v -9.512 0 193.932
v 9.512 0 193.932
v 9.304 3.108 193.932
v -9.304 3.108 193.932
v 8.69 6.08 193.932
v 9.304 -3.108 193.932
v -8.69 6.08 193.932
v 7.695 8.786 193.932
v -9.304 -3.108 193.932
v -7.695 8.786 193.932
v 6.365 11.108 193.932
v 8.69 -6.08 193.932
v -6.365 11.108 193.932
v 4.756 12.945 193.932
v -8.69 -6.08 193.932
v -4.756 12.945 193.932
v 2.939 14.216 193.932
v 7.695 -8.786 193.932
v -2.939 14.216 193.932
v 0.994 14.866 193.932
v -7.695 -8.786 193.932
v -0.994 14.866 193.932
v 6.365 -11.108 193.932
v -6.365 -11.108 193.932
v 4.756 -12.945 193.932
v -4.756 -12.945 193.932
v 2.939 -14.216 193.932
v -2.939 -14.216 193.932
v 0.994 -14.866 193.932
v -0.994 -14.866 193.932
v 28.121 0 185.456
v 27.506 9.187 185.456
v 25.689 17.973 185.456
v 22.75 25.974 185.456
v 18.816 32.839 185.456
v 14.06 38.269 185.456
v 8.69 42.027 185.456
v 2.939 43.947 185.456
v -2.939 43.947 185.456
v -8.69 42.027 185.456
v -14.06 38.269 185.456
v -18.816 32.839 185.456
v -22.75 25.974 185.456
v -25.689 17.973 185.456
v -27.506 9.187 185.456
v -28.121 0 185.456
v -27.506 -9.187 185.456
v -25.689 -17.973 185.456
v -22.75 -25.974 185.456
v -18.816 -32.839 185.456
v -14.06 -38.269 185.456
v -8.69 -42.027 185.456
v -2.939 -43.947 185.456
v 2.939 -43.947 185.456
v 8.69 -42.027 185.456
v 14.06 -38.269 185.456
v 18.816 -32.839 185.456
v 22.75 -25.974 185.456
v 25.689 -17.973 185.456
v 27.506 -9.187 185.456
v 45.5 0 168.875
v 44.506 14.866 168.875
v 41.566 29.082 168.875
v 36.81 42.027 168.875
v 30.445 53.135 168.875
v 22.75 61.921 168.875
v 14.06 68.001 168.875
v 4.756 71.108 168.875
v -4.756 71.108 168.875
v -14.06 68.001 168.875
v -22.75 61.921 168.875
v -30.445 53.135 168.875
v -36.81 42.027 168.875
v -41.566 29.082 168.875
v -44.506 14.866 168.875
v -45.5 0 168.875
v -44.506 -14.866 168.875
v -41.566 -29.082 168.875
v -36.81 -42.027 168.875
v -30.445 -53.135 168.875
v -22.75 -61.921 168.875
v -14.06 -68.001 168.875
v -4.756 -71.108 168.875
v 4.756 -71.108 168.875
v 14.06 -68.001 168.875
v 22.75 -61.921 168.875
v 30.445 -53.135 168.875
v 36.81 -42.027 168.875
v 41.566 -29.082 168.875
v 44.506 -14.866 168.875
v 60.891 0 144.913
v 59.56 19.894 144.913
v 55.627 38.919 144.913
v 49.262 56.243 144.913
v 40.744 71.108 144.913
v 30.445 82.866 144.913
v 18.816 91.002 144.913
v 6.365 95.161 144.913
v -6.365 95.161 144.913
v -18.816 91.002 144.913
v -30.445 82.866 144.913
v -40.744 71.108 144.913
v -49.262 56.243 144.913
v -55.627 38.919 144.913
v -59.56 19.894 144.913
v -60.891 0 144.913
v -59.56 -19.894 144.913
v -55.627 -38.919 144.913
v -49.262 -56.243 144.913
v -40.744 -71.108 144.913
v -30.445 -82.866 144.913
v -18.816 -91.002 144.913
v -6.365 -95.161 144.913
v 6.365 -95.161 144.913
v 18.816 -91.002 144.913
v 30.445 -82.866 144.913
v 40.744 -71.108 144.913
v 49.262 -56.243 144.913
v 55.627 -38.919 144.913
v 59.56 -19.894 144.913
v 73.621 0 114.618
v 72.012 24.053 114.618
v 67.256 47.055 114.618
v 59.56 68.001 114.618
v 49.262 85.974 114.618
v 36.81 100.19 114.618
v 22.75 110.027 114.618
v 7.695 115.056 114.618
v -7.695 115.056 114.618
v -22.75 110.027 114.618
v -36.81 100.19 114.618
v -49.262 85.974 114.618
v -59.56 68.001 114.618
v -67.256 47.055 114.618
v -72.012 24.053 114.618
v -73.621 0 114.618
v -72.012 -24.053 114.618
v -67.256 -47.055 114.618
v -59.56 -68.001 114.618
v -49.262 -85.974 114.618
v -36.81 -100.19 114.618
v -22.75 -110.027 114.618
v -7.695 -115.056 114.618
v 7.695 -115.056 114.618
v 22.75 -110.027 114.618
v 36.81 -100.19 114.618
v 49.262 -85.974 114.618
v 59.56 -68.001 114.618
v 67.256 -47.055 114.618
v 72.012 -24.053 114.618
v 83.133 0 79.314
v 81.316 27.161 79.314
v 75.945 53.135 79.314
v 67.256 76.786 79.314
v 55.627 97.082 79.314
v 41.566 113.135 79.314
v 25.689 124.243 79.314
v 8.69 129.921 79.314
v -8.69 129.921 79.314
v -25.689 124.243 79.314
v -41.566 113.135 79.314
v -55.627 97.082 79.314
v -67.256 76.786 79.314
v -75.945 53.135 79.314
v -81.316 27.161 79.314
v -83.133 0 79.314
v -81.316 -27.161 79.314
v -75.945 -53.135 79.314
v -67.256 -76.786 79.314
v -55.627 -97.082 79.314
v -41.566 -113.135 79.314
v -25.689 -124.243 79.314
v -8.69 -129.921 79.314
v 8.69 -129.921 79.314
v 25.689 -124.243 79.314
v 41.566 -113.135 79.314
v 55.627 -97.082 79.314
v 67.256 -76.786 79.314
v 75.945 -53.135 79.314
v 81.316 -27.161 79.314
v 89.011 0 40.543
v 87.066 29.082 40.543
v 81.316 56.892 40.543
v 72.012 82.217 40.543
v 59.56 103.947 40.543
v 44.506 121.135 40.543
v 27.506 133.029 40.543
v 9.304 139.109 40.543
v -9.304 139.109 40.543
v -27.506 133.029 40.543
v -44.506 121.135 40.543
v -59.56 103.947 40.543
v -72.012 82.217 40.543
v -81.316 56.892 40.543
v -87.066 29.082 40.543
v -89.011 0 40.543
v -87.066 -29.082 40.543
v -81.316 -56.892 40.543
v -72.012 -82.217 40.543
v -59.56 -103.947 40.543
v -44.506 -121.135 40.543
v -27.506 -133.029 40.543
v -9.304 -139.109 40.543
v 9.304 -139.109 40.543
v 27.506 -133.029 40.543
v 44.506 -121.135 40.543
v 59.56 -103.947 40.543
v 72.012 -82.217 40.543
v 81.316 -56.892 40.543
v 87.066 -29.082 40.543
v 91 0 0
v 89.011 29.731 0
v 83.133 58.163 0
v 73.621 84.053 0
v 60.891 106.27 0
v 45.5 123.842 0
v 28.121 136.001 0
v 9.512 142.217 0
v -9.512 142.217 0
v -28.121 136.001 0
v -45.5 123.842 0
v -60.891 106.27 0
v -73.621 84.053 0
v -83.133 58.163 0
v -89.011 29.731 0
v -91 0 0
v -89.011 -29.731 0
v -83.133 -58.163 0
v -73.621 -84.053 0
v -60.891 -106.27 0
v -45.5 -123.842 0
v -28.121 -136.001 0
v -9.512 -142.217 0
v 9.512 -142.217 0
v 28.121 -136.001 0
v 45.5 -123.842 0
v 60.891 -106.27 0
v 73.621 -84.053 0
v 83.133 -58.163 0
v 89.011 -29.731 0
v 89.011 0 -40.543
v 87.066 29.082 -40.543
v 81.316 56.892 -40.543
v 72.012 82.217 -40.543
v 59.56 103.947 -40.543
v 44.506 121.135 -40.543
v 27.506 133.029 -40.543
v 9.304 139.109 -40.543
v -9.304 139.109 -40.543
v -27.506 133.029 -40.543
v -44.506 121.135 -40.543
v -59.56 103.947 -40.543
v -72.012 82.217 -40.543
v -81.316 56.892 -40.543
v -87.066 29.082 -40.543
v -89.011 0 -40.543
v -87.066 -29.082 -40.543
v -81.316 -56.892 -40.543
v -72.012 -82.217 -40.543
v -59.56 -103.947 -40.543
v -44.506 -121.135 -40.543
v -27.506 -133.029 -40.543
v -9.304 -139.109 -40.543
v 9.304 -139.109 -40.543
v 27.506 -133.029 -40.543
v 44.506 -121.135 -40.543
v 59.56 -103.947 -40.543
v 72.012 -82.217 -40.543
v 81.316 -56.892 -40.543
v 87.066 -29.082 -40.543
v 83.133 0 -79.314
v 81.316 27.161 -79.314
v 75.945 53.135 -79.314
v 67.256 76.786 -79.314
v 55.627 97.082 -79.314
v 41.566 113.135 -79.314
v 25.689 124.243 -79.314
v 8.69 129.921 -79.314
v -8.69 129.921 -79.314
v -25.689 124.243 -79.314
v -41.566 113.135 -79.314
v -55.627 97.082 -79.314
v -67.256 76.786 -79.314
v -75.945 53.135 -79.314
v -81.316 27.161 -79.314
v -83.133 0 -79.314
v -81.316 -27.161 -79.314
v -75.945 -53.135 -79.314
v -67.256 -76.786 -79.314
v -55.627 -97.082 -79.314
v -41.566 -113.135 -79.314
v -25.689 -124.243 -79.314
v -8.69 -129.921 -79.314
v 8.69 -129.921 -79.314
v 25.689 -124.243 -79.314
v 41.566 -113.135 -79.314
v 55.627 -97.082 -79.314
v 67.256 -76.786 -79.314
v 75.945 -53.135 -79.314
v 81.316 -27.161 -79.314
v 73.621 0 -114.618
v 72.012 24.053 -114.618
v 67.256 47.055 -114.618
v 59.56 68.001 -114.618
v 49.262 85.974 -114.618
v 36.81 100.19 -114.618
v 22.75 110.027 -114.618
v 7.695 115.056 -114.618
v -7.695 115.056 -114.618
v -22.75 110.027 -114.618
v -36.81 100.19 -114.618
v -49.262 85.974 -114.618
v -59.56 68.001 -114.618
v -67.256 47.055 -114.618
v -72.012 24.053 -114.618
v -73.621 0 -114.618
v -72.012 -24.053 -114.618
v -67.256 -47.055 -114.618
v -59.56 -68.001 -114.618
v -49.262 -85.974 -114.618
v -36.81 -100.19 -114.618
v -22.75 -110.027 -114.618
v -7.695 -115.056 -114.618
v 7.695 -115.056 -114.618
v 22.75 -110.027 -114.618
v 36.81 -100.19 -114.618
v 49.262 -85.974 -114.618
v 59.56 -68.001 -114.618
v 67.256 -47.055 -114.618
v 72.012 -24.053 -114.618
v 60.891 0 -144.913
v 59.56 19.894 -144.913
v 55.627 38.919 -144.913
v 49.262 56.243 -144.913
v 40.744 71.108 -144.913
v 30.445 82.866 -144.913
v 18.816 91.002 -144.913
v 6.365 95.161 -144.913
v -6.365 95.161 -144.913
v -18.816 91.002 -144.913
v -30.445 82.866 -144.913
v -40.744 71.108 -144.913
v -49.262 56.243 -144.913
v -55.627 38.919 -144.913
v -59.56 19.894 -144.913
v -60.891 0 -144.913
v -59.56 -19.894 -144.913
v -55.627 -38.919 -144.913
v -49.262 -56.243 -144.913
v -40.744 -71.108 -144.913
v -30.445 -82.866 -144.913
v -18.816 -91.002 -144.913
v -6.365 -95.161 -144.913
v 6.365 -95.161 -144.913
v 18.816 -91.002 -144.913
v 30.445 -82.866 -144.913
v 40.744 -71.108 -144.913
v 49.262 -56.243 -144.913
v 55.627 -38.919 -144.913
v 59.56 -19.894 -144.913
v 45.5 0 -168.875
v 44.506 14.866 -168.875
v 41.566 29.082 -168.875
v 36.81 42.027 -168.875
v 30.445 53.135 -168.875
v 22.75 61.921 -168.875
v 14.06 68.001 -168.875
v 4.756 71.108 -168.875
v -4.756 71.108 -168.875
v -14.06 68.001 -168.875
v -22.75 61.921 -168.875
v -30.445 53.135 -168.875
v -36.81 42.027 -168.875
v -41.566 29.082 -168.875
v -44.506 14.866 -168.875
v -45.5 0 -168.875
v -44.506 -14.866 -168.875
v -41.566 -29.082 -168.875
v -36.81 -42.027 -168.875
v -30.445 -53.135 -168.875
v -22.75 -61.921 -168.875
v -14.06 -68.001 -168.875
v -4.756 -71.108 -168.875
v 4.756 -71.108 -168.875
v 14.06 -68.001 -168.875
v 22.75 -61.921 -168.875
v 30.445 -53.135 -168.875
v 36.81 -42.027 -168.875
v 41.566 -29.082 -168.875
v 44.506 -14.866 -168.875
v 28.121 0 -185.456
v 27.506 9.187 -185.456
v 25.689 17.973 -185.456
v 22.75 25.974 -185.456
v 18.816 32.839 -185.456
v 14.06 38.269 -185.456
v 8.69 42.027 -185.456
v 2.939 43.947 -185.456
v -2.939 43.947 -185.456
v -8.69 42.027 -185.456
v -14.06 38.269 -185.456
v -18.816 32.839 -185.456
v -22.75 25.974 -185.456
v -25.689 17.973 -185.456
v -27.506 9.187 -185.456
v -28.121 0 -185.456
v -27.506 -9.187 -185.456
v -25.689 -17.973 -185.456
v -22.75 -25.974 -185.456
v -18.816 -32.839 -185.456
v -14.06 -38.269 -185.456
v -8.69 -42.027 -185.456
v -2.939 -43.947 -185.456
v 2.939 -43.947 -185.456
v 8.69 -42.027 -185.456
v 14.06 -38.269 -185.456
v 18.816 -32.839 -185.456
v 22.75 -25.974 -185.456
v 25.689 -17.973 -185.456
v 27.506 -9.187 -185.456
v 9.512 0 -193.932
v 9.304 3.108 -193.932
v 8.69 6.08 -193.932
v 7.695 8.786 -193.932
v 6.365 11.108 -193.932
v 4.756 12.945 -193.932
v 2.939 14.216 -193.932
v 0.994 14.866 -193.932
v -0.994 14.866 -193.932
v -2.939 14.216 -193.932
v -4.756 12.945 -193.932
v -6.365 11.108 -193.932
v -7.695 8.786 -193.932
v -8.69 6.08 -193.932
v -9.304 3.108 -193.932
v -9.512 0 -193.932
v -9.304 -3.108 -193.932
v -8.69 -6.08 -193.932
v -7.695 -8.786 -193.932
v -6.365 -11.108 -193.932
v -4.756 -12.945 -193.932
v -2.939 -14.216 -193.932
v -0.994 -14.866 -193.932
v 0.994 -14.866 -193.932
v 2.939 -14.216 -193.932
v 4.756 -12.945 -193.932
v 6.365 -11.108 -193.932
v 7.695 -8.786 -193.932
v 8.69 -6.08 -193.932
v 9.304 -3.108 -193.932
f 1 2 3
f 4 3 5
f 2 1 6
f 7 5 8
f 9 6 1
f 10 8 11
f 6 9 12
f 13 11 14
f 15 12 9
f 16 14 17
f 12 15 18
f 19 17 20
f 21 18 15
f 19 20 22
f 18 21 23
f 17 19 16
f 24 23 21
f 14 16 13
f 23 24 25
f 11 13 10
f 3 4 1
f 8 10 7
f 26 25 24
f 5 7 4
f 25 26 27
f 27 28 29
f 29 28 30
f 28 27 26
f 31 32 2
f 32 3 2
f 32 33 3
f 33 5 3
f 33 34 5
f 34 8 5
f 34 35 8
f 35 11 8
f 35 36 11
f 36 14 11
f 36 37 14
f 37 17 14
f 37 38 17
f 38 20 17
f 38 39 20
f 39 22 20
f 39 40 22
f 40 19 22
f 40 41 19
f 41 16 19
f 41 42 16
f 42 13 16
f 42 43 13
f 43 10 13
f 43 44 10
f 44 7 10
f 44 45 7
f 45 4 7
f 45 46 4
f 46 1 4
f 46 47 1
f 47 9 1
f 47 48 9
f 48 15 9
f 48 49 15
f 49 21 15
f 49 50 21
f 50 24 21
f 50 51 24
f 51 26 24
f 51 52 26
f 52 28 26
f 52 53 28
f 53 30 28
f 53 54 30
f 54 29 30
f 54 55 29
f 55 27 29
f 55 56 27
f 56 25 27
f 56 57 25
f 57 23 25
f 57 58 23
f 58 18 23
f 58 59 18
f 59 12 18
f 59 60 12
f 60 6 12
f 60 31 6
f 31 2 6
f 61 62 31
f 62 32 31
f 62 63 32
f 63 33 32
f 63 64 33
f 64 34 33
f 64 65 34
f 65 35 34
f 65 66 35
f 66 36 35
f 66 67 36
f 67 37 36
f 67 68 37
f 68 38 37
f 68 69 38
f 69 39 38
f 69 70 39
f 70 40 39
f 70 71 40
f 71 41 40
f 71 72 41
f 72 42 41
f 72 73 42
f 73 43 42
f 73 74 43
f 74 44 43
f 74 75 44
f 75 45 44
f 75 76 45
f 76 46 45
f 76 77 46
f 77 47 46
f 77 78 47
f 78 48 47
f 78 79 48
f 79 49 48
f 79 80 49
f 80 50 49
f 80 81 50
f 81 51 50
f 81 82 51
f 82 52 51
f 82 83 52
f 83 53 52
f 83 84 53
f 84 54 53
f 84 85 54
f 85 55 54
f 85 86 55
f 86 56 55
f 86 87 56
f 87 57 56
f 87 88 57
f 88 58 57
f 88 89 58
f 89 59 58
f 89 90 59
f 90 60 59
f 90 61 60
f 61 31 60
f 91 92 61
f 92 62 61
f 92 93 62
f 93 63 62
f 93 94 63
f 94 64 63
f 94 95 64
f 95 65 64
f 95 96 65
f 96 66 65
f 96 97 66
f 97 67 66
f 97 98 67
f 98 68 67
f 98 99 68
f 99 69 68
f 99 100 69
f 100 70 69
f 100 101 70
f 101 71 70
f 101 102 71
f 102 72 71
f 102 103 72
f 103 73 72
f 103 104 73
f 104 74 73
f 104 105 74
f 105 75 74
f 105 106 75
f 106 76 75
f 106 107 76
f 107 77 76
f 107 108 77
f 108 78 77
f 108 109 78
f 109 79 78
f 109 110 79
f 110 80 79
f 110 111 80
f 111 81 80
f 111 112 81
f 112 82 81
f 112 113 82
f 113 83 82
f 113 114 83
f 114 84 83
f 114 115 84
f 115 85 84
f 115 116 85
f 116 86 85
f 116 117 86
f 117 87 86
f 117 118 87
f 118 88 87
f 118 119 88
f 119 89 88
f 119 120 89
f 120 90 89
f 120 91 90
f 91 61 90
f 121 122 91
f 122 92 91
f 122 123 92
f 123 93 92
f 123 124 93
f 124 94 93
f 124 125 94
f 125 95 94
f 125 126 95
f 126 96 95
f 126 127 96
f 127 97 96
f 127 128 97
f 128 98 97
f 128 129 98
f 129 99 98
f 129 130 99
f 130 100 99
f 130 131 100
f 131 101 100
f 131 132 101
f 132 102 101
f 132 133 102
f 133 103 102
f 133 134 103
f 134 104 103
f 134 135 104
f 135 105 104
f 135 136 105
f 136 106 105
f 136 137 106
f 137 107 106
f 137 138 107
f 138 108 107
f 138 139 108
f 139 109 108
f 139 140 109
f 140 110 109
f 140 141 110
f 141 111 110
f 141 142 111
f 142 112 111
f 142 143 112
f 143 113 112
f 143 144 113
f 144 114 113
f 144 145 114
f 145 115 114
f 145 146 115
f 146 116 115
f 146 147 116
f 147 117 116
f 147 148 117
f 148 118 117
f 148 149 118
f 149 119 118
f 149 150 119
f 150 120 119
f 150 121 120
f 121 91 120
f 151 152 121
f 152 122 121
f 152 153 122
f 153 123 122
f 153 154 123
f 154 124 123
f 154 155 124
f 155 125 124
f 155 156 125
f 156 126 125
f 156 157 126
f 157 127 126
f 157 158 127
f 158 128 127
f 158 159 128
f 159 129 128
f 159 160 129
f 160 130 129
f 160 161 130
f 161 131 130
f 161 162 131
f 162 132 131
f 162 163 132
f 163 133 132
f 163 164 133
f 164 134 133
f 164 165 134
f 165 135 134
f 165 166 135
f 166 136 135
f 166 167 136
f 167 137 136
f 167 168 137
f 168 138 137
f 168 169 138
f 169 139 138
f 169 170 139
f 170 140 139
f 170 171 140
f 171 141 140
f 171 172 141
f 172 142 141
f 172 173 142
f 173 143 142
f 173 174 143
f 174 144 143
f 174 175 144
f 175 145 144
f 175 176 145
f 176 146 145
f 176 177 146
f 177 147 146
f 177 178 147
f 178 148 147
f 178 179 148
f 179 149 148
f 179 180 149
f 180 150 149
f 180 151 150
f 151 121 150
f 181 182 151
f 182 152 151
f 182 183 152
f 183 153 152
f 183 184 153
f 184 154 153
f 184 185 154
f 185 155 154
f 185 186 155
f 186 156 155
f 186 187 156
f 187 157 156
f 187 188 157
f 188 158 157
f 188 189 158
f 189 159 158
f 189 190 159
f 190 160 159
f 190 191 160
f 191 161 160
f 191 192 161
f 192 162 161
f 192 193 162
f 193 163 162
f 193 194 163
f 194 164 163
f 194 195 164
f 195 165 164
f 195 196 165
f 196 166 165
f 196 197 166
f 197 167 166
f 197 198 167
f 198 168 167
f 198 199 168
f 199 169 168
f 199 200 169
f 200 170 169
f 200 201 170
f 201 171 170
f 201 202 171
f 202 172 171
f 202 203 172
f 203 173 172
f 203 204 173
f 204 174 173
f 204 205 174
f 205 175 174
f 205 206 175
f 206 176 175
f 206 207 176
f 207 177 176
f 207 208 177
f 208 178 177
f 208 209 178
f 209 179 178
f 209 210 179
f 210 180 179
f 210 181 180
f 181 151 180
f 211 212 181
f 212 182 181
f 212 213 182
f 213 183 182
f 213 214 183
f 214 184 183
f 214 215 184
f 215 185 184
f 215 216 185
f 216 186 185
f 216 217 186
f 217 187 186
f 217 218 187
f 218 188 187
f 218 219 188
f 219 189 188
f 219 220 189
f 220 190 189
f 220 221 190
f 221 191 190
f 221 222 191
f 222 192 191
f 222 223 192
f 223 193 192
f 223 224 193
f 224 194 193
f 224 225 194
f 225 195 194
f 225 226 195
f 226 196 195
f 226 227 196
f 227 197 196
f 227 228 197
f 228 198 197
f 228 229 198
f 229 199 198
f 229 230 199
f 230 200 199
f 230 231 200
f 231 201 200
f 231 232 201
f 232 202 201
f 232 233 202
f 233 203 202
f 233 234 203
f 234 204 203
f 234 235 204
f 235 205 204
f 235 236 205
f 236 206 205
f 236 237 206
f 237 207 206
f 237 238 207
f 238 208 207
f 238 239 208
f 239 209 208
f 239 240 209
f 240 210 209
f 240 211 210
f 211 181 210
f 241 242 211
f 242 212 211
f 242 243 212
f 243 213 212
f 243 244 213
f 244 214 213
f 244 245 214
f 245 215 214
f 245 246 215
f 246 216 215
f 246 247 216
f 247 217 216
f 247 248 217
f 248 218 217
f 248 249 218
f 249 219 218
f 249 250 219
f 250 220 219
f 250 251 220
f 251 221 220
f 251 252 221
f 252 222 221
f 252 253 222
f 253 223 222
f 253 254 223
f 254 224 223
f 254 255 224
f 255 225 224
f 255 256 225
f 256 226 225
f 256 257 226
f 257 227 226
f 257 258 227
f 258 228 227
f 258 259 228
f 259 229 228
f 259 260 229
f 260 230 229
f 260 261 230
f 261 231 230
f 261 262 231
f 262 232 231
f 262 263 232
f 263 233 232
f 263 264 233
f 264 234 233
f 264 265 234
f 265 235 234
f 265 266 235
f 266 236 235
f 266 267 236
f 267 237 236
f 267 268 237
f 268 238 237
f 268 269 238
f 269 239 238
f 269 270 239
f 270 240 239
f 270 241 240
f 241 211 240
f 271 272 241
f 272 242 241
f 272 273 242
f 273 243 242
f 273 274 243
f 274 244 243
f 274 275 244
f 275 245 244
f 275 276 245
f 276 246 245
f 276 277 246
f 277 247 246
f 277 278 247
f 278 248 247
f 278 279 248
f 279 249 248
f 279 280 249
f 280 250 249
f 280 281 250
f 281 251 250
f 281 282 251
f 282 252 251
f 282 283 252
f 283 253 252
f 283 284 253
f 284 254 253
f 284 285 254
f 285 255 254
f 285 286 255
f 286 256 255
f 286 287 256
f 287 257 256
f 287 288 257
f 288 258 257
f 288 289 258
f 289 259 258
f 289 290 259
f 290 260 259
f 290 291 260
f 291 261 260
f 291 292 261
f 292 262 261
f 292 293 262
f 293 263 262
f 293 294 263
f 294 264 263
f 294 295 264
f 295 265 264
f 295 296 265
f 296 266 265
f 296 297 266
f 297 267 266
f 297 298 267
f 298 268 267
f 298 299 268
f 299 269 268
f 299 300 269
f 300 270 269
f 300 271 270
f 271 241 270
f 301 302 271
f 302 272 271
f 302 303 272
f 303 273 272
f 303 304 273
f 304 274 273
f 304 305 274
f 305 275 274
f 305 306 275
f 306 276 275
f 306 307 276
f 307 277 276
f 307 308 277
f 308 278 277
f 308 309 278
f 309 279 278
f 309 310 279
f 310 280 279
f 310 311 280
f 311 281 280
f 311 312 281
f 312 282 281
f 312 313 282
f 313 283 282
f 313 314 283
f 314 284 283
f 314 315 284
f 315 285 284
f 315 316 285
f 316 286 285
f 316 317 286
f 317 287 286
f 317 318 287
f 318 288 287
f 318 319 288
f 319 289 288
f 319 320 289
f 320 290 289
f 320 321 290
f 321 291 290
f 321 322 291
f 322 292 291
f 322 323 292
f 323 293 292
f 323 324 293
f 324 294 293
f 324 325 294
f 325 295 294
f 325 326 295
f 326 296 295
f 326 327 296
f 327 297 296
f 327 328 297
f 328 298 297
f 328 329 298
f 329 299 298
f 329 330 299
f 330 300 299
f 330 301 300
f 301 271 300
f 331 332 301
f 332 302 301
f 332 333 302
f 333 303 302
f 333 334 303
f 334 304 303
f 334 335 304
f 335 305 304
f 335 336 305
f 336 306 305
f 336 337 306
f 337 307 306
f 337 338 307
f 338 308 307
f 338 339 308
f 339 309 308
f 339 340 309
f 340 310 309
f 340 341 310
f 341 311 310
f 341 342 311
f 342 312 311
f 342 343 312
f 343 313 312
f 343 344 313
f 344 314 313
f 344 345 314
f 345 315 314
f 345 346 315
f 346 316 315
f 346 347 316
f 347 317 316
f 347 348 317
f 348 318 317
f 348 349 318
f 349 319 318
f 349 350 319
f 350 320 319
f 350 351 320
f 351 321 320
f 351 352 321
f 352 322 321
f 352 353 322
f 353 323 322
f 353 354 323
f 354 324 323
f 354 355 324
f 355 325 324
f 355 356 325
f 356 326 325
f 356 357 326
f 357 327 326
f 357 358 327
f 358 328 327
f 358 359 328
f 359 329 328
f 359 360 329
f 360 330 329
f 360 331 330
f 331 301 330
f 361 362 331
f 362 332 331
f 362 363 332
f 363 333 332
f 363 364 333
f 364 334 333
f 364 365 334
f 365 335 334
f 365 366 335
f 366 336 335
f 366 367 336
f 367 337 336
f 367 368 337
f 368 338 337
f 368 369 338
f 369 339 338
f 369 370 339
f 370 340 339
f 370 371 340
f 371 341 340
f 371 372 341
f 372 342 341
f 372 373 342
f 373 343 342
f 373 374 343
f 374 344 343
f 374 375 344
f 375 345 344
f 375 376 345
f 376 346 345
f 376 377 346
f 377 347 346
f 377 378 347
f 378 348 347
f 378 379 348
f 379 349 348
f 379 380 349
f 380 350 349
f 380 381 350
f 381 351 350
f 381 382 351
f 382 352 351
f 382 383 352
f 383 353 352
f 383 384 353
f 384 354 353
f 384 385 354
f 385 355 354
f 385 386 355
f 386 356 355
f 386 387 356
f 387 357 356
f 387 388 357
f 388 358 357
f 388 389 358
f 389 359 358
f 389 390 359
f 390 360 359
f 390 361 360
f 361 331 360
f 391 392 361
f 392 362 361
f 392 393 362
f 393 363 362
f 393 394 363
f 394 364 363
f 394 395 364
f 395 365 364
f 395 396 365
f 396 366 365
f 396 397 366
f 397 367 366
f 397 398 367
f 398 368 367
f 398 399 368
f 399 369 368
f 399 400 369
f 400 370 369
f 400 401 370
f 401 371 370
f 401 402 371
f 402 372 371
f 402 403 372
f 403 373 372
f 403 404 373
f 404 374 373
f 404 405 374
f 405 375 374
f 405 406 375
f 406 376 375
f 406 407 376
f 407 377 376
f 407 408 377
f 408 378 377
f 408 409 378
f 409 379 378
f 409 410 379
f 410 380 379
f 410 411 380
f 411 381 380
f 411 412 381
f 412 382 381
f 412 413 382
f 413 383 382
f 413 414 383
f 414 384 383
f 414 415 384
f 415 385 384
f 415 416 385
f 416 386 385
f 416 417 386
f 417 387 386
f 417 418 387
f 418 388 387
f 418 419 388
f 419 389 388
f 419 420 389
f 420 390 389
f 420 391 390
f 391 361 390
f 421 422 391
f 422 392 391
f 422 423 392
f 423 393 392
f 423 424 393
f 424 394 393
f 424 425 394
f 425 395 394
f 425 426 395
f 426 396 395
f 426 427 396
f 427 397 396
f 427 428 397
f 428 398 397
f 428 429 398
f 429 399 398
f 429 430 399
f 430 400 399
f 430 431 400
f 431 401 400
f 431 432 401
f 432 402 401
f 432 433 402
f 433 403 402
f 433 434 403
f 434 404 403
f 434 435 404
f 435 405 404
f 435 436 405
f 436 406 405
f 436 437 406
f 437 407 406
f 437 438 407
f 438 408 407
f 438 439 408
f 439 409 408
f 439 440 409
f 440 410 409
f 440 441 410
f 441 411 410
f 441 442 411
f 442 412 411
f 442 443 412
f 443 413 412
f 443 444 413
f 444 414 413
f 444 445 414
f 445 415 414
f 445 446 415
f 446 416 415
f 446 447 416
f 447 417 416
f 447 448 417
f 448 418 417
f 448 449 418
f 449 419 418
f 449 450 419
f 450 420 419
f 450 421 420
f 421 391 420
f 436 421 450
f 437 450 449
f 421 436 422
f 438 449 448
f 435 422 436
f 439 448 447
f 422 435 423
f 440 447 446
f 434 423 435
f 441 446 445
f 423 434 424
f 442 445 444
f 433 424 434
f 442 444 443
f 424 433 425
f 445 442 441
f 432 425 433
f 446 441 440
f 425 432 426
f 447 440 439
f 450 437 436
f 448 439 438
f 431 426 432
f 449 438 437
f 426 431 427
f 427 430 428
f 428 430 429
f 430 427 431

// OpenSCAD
// Generated by SolidPython 1.0.1 on 2020-07-29 00:46:47


scale(v = [7, 11, 15]) {
	sphere(r = 13);
}
/***********************************************
*********      SolidPython code:      **********
************************************************
 
# import packages: SolidPython
from solid import *
from solid.utils import *
from itertools import chain, combinations, permutations


class Resize:

    def __init__(self, scad_file):
        self.scad_file = scad_file
        #self.scad_file = import_scad(scad_file)
        # cone/cylinder param:
        self.r1 = 0
        self.r2 = 0
        self.h = 0
        # rectangular prism param:
        self.w = 0
        self.l = 0
        # ellipse param:
        self.r = 0

    # import OpenScad code (file name corresponds to shape)


    # classify shape + parameters
    def assign(self, param1, param2, param3):
        if self.scad_file == 'cone.scad':
            self.r1 = param1
            self.r2 = param2
            self.h = param3
        elif self.scad_file == 'cylinder.scad':
            self.r1 = param1
            self.r2 = param2
            self.h = param3
        elif self.scad_file == 'rectangularPrism.scad':
            self.h = param1
            self.l = param2
            self.w = param3
        else:
            self.r = param1
            self.h = param2

    # resize parameters
    def iterate(self):
        x = range(3, 20, 2)
        i = 1
        if self.scad_file == 'cone.scad':
            tempList = list(permutations(x, 2))
            for temp in tempList:
                param1 = temp[0]
                param2 = temp[1]
                filepath = 'produced_scad_files/' + 'cone' + str(param1) + '_' + str(param2) + '_' + '.scad'
                scad_render_to_file(cylinder(h=param1, r1=param2, r2=0), filepath)

        elif self.scad_file == 'cylinder.scad':
            tempList = list(permutations(x, 3))
            for temp in tempList:
                param1 = temp[0]
                param2 = temp[1]
                filepath = 'produced_scad_files/' + 'cylinder' + str(param1) + '_' + str(param2) + '_' + '.scad'
                scad_render_to_file(cylinder(h=param1, r1=param2, r2=param2), filepath)

        elif self.scad_file == 'rectangularPrism.scad':
            tempList = list(permutations(x, 3))
            for temp in tempList:
                param1 = temp[0]
                param2 = temp[1]
                param3 = temp[2]
                filepath = 'produced_scad_files/' + 'rectangularPrism' + str(param1) + '_' + str(param2) + '_' + str(
                    param3) + '.scad'
                scad_render_to_file(cube(size=(param1, param2, param3)), filepath)

        elif self.scad_file == 'ellipse.scad':
            tempList = list(permutations(x, 4))
            for temp in tempList:
                param1 = temp[0]
                param2 = temp[1]
                param3 = temp[2]
                param4 = temp[3]
                filepath = 'produced_scad_files/' + 'ellipse' + str(param1) + '_' + str(param2) + '_' + str(param3) + '_' + str(param4) + '.scad'
                scad_render_to_file(scale([param1, param2, param3])(sphere(r=param4)), filepath)

    def render_to_scadfile(self):
        scad_render_to_file(scad, 'example.scad') 
 
************************************************/
